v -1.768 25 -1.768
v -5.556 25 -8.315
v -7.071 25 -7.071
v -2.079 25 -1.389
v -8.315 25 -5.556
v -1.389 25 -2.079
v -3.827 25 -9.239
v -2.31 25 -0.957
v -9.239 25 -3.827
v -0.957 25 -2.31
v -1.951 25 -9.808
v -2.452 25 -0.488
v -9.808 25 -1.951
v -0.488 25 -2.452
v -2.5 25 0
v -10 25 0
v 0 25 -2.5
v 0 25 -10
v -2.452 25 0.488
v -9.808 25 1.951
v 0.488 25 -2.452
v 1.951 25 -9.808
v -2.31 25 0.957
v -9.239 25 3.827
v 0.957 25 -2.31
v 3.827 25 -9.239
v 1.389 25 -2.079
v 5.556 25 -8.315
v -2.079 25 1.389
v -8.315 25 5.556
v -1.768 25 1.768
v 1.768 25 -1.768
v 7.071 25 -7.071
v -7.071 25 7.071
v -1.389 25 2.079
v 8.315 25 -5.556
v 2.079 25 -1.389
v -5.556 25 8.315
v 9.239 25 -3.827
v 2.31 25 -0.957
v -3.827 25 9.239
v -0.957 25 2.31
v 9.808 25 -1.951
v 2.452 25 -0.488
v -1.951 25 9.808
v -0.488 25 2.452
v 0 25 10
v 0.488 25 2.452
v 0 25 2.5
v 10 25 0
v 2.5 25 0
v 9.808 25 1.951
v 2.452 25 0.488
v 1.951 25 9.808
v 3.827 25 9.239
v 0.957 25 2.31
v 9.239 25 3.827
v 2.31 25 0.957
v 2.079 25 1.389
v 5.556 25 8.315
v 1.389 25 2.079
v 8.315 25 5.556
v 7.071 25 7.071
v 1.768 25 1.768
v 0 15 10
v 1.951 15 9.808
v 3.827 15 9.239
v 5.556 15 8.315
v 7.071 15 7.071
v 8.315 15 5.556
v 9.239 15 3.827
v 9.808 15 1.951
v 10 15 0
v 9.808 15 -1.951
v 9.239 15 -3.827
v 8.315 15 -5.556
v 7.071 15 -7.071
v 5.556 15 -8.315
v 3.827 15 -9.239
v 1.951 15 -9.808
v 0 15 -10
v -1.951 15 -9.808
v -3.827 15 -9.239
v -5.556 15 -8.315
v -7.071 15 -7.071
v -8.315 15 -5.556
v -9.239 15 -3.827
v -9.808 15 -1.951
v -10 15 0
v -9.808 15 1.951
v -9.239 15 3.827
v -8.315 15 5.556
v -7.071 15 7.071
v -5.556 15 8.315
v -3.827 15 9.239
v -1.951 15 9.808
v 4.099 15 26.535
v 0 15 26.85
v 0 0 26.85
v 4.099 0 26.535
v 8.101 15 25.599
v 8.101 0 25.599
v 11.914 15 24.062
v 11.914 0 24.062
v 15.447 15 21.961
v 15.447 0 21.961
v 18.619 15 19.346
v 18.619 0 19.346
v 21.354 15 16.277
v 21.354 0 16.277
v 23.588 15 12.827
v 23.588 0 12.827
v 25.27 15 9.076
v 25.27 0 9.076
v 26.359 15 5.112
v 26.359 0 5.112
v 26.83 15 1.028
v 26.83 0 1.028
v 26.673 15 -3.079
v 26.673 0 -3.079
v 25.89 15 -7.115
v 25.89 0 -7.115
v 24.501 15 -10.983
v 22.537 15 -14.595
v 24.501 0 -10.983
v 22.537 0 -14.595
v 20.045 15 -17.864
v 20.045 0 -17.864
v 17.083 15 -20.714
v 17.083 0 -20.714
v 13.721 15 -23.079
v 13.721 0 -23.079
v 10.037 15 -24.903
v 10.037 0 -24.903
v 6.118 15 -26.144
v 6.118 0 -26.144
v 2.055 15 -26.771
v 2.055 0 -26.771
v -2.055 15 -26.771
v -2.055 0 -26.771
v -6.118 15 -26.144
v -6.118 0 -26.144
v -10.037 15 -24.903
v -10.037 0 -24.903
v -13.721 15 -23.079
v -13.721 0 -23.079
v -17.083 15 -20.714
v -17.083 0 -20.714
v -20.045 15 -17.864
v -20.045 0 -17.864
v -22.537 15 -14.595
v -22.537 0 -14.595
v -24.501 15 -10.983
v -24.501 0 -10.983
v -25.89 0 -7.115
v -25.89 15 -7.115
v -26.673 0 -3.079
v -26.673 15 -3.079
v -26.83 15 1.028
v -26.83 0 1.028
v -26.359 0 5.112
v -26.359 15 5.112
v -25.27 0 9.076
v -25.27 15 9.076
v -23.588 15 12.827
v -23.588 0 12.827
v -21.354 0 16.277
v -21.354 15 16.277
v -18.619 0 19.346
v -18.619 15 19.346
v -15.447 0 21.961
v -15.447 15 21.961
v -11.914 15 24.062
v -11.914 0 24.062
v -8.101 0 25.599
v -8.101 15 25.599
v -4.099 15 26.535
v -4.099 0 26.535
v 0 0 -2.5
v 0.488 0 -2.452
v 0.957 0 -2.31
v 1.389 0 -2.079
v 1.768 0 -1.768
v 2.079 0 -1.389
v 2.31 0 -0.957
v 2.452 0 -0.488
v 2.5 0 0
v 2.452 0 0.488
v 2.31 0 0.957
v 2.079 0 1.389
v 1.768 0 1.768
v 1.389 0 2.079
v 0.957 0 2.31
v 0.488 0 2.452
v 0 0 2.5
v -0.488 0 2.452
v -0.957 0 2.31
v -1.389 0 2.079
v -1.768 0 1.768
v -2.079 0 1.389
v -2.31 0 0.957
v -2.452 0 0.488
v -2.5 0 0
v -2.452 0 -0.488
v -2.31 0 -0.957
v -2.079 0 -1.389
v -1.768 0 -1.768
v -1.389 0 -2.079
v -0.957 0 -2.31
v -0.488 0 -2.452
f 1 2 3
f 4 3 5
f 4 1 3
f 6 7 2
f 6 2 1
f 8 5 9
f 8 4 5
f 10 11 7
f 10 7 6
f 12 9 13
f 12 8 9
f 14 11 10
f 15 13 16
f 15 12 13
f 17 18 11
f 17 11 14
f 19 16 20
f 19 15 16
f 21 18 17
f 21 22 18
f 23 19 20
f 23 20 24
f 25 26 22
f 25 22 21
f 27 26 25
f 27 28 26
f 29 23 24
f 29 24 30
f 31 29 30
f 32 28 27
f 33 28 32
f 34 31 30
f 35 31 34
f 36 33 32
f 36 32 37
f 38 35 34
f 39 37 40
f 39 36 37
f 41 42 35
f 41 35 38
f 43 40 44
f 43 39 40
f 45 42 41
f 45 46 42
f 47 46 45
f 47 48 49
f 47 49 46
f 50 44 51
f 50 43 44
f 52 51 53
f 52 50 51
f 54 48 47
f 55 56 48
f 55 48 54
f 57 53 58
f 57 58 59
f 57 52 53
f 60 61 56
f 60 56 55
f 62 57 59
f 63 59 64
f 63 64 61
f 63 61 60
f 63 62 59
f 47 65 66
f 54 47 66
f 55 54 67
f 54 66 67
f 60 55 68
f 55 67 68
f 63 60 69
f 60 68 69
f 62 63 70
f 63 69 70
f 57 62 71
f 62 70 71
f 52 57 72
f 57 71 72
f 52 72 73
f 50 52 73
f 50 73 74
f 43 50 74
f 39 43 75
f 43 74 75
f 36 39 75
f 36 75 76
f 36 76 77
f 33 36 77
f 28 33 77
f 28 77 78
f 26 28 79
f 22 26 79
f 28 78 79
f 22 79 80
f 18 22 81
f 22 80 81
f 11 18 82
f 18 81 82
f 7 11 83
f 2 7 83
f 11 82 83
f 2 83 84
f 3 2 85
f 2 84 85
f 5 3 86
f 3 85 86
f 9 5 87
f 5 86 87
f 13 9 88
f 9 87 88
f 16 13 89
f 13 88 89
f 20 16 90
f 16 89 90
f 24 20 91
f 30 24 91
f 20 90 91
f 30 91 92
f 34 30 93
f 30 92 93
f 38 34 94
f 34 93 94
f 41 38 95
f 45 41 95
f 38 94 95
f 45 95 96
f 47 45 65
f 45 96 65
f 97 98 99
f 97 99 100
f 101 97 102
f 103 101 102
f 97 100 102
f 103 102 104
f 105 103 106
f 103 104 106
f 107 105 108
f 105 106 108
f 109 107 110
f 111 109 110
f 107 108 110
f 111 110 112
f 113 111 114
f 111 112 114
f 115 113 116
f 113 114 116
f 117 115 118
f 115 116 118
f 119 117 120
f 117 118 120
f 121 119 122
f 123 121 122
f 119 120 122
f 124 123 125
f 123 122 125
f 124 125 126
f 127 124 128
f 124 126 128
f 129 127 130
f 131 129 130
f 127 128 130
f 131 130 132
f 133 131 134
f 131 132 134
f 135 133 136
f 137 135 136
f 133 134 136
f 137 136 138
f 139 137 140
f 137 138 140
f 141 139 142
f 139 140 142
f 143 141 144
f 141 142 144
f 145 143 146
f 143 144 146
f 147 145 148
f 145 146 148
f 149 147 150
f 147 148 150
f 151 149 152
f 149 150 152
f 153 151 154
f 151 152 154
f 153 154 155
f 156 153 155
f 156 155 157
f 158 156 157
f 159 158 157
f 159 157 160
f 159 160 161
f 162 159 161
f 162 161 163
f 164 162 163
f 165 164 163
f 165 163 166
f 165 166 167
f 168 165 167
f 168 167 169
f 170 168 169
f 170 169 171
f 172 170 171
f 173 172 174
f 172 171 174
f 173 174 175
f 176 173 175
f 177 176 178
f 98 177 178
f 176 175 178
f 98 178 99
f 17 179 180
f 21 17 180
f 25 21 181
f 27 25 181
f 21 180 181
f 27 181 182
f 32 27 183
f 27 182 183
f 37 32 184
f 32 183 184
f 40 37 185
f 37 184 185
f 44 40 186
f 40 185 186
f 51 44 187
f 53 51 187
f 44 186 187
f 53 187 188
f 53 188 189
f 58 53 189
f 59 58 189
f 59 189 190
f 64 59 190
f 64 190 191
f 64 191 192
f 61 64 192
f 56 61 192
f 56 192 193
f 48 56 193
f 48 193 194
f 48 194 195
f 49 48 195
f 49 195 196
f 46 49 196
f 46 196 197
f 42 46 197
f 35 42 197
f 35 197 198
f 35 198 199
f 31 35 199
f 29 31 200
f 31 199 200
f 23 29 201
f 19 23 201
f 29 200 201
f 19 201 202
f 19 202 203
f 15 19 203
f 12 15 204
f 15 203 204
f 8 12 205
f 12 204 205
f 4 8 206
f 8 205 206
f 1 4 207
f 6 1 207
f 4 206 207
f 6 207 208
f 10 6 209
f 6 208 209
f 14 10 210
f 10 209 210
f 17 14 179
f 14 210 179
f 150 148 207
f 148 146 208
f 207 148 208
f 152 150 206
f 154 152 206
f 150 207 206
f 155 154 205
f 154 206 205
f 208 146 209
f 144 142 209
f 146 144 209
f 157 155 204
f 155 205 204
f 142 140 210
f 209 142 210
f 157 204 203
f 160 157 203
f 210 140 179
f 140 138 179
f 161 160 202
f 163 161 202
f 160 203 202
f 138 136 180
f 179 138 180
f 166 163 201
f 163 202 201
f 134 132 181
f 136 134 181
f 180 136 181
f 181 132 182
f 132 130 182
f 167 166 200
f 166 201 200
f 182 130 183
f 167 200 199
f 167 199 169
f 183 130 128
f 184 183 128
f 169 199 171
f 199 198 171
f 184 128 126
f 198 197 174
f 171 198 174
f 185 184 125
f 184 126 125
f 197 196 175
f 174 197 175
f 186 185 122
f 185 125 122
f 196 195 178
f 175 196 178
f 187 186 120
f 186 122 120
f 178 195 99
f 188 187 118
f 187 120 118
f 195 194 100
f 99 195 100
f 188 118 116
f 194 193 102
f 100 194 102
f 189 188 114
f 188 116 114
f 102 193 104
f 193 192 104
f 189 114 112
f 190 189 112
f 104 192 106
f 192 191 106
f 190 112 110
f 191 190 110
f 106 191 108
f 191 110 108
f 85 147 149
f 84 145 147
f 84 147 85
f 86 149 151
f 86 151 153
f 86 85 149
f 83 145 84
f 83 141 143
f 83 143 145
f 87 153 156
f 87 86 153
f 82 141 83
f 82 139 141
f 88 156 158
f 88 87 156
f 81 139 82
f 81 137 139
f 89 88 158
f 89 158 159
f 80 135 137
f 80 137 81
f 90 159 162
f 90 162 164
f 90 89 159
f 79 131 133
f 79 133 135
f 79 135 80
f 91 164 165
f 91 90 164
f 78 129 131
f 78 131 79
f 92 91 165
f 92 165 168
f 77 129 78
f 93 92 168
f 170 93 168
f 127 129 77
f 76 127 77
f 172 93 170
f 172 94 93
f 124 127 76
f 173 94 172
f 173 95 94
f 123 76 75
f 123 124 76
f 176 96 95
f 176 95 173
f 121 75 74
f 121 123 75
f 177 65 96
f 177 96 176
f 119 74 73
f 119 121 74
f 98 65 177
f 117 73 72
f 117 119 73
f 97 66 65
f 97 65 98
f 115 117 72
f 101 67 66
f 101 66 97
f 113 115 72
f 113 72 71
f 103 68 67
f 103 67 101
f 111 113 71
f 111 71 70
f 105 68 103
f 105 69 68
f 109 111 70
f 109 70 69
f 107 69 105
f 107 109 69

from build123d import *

# Parameters (mm, degrees)
SKETCH_1_R          = 26.85
EXTRUDE_1_DEPTH     = 15
SKETCH_3_R          = 10
EXTRUDE_2_DEPTH     = 10
SKETCH_2_R          = 2.5
CUT_EXTRUDE_1_DEPTH = 46.462567019


with BuildPart() as part:
    # 스케치1 → 보스-돌출1 (new body)
    with BuildSketch(Plane(origin=(0, 0, 0), x_dir=(1, 0, 0), z_dir=(0, 1, 0))):
        with Locations(Location((0, 0, 0), (0, 0, 270))):
            Circle(SKETCH_1_R)
    extrude(amount=EXTRUDE_1_DEPTH)

    # 스케치3 → 보스-돌출2 (add)
    with BuildSketch(Plane(origin=(0, 15, 0), x_dir=(1, 0, 0), z_dir=(0, 1, 0))):
        with Locations(Location((0, 0, 0), (0, 0, 270))):
            Circle(SKETCH_3_R)
    extrude(amount=EXTRUDE_2_DEPTH)

    # 스케치2 → 컷-돌출1 (cut, through all)
    with BuildSketch(Plane.XZ):
        with Locations(Location((0, 0, 0), (0, 0, 270))):
            Circle(SKETCH_2_R)
    extrude(amount=-CUT_EXTRUDE_1_DEPTH, mode=Mode.SUBTRACT)


solid = part.part
